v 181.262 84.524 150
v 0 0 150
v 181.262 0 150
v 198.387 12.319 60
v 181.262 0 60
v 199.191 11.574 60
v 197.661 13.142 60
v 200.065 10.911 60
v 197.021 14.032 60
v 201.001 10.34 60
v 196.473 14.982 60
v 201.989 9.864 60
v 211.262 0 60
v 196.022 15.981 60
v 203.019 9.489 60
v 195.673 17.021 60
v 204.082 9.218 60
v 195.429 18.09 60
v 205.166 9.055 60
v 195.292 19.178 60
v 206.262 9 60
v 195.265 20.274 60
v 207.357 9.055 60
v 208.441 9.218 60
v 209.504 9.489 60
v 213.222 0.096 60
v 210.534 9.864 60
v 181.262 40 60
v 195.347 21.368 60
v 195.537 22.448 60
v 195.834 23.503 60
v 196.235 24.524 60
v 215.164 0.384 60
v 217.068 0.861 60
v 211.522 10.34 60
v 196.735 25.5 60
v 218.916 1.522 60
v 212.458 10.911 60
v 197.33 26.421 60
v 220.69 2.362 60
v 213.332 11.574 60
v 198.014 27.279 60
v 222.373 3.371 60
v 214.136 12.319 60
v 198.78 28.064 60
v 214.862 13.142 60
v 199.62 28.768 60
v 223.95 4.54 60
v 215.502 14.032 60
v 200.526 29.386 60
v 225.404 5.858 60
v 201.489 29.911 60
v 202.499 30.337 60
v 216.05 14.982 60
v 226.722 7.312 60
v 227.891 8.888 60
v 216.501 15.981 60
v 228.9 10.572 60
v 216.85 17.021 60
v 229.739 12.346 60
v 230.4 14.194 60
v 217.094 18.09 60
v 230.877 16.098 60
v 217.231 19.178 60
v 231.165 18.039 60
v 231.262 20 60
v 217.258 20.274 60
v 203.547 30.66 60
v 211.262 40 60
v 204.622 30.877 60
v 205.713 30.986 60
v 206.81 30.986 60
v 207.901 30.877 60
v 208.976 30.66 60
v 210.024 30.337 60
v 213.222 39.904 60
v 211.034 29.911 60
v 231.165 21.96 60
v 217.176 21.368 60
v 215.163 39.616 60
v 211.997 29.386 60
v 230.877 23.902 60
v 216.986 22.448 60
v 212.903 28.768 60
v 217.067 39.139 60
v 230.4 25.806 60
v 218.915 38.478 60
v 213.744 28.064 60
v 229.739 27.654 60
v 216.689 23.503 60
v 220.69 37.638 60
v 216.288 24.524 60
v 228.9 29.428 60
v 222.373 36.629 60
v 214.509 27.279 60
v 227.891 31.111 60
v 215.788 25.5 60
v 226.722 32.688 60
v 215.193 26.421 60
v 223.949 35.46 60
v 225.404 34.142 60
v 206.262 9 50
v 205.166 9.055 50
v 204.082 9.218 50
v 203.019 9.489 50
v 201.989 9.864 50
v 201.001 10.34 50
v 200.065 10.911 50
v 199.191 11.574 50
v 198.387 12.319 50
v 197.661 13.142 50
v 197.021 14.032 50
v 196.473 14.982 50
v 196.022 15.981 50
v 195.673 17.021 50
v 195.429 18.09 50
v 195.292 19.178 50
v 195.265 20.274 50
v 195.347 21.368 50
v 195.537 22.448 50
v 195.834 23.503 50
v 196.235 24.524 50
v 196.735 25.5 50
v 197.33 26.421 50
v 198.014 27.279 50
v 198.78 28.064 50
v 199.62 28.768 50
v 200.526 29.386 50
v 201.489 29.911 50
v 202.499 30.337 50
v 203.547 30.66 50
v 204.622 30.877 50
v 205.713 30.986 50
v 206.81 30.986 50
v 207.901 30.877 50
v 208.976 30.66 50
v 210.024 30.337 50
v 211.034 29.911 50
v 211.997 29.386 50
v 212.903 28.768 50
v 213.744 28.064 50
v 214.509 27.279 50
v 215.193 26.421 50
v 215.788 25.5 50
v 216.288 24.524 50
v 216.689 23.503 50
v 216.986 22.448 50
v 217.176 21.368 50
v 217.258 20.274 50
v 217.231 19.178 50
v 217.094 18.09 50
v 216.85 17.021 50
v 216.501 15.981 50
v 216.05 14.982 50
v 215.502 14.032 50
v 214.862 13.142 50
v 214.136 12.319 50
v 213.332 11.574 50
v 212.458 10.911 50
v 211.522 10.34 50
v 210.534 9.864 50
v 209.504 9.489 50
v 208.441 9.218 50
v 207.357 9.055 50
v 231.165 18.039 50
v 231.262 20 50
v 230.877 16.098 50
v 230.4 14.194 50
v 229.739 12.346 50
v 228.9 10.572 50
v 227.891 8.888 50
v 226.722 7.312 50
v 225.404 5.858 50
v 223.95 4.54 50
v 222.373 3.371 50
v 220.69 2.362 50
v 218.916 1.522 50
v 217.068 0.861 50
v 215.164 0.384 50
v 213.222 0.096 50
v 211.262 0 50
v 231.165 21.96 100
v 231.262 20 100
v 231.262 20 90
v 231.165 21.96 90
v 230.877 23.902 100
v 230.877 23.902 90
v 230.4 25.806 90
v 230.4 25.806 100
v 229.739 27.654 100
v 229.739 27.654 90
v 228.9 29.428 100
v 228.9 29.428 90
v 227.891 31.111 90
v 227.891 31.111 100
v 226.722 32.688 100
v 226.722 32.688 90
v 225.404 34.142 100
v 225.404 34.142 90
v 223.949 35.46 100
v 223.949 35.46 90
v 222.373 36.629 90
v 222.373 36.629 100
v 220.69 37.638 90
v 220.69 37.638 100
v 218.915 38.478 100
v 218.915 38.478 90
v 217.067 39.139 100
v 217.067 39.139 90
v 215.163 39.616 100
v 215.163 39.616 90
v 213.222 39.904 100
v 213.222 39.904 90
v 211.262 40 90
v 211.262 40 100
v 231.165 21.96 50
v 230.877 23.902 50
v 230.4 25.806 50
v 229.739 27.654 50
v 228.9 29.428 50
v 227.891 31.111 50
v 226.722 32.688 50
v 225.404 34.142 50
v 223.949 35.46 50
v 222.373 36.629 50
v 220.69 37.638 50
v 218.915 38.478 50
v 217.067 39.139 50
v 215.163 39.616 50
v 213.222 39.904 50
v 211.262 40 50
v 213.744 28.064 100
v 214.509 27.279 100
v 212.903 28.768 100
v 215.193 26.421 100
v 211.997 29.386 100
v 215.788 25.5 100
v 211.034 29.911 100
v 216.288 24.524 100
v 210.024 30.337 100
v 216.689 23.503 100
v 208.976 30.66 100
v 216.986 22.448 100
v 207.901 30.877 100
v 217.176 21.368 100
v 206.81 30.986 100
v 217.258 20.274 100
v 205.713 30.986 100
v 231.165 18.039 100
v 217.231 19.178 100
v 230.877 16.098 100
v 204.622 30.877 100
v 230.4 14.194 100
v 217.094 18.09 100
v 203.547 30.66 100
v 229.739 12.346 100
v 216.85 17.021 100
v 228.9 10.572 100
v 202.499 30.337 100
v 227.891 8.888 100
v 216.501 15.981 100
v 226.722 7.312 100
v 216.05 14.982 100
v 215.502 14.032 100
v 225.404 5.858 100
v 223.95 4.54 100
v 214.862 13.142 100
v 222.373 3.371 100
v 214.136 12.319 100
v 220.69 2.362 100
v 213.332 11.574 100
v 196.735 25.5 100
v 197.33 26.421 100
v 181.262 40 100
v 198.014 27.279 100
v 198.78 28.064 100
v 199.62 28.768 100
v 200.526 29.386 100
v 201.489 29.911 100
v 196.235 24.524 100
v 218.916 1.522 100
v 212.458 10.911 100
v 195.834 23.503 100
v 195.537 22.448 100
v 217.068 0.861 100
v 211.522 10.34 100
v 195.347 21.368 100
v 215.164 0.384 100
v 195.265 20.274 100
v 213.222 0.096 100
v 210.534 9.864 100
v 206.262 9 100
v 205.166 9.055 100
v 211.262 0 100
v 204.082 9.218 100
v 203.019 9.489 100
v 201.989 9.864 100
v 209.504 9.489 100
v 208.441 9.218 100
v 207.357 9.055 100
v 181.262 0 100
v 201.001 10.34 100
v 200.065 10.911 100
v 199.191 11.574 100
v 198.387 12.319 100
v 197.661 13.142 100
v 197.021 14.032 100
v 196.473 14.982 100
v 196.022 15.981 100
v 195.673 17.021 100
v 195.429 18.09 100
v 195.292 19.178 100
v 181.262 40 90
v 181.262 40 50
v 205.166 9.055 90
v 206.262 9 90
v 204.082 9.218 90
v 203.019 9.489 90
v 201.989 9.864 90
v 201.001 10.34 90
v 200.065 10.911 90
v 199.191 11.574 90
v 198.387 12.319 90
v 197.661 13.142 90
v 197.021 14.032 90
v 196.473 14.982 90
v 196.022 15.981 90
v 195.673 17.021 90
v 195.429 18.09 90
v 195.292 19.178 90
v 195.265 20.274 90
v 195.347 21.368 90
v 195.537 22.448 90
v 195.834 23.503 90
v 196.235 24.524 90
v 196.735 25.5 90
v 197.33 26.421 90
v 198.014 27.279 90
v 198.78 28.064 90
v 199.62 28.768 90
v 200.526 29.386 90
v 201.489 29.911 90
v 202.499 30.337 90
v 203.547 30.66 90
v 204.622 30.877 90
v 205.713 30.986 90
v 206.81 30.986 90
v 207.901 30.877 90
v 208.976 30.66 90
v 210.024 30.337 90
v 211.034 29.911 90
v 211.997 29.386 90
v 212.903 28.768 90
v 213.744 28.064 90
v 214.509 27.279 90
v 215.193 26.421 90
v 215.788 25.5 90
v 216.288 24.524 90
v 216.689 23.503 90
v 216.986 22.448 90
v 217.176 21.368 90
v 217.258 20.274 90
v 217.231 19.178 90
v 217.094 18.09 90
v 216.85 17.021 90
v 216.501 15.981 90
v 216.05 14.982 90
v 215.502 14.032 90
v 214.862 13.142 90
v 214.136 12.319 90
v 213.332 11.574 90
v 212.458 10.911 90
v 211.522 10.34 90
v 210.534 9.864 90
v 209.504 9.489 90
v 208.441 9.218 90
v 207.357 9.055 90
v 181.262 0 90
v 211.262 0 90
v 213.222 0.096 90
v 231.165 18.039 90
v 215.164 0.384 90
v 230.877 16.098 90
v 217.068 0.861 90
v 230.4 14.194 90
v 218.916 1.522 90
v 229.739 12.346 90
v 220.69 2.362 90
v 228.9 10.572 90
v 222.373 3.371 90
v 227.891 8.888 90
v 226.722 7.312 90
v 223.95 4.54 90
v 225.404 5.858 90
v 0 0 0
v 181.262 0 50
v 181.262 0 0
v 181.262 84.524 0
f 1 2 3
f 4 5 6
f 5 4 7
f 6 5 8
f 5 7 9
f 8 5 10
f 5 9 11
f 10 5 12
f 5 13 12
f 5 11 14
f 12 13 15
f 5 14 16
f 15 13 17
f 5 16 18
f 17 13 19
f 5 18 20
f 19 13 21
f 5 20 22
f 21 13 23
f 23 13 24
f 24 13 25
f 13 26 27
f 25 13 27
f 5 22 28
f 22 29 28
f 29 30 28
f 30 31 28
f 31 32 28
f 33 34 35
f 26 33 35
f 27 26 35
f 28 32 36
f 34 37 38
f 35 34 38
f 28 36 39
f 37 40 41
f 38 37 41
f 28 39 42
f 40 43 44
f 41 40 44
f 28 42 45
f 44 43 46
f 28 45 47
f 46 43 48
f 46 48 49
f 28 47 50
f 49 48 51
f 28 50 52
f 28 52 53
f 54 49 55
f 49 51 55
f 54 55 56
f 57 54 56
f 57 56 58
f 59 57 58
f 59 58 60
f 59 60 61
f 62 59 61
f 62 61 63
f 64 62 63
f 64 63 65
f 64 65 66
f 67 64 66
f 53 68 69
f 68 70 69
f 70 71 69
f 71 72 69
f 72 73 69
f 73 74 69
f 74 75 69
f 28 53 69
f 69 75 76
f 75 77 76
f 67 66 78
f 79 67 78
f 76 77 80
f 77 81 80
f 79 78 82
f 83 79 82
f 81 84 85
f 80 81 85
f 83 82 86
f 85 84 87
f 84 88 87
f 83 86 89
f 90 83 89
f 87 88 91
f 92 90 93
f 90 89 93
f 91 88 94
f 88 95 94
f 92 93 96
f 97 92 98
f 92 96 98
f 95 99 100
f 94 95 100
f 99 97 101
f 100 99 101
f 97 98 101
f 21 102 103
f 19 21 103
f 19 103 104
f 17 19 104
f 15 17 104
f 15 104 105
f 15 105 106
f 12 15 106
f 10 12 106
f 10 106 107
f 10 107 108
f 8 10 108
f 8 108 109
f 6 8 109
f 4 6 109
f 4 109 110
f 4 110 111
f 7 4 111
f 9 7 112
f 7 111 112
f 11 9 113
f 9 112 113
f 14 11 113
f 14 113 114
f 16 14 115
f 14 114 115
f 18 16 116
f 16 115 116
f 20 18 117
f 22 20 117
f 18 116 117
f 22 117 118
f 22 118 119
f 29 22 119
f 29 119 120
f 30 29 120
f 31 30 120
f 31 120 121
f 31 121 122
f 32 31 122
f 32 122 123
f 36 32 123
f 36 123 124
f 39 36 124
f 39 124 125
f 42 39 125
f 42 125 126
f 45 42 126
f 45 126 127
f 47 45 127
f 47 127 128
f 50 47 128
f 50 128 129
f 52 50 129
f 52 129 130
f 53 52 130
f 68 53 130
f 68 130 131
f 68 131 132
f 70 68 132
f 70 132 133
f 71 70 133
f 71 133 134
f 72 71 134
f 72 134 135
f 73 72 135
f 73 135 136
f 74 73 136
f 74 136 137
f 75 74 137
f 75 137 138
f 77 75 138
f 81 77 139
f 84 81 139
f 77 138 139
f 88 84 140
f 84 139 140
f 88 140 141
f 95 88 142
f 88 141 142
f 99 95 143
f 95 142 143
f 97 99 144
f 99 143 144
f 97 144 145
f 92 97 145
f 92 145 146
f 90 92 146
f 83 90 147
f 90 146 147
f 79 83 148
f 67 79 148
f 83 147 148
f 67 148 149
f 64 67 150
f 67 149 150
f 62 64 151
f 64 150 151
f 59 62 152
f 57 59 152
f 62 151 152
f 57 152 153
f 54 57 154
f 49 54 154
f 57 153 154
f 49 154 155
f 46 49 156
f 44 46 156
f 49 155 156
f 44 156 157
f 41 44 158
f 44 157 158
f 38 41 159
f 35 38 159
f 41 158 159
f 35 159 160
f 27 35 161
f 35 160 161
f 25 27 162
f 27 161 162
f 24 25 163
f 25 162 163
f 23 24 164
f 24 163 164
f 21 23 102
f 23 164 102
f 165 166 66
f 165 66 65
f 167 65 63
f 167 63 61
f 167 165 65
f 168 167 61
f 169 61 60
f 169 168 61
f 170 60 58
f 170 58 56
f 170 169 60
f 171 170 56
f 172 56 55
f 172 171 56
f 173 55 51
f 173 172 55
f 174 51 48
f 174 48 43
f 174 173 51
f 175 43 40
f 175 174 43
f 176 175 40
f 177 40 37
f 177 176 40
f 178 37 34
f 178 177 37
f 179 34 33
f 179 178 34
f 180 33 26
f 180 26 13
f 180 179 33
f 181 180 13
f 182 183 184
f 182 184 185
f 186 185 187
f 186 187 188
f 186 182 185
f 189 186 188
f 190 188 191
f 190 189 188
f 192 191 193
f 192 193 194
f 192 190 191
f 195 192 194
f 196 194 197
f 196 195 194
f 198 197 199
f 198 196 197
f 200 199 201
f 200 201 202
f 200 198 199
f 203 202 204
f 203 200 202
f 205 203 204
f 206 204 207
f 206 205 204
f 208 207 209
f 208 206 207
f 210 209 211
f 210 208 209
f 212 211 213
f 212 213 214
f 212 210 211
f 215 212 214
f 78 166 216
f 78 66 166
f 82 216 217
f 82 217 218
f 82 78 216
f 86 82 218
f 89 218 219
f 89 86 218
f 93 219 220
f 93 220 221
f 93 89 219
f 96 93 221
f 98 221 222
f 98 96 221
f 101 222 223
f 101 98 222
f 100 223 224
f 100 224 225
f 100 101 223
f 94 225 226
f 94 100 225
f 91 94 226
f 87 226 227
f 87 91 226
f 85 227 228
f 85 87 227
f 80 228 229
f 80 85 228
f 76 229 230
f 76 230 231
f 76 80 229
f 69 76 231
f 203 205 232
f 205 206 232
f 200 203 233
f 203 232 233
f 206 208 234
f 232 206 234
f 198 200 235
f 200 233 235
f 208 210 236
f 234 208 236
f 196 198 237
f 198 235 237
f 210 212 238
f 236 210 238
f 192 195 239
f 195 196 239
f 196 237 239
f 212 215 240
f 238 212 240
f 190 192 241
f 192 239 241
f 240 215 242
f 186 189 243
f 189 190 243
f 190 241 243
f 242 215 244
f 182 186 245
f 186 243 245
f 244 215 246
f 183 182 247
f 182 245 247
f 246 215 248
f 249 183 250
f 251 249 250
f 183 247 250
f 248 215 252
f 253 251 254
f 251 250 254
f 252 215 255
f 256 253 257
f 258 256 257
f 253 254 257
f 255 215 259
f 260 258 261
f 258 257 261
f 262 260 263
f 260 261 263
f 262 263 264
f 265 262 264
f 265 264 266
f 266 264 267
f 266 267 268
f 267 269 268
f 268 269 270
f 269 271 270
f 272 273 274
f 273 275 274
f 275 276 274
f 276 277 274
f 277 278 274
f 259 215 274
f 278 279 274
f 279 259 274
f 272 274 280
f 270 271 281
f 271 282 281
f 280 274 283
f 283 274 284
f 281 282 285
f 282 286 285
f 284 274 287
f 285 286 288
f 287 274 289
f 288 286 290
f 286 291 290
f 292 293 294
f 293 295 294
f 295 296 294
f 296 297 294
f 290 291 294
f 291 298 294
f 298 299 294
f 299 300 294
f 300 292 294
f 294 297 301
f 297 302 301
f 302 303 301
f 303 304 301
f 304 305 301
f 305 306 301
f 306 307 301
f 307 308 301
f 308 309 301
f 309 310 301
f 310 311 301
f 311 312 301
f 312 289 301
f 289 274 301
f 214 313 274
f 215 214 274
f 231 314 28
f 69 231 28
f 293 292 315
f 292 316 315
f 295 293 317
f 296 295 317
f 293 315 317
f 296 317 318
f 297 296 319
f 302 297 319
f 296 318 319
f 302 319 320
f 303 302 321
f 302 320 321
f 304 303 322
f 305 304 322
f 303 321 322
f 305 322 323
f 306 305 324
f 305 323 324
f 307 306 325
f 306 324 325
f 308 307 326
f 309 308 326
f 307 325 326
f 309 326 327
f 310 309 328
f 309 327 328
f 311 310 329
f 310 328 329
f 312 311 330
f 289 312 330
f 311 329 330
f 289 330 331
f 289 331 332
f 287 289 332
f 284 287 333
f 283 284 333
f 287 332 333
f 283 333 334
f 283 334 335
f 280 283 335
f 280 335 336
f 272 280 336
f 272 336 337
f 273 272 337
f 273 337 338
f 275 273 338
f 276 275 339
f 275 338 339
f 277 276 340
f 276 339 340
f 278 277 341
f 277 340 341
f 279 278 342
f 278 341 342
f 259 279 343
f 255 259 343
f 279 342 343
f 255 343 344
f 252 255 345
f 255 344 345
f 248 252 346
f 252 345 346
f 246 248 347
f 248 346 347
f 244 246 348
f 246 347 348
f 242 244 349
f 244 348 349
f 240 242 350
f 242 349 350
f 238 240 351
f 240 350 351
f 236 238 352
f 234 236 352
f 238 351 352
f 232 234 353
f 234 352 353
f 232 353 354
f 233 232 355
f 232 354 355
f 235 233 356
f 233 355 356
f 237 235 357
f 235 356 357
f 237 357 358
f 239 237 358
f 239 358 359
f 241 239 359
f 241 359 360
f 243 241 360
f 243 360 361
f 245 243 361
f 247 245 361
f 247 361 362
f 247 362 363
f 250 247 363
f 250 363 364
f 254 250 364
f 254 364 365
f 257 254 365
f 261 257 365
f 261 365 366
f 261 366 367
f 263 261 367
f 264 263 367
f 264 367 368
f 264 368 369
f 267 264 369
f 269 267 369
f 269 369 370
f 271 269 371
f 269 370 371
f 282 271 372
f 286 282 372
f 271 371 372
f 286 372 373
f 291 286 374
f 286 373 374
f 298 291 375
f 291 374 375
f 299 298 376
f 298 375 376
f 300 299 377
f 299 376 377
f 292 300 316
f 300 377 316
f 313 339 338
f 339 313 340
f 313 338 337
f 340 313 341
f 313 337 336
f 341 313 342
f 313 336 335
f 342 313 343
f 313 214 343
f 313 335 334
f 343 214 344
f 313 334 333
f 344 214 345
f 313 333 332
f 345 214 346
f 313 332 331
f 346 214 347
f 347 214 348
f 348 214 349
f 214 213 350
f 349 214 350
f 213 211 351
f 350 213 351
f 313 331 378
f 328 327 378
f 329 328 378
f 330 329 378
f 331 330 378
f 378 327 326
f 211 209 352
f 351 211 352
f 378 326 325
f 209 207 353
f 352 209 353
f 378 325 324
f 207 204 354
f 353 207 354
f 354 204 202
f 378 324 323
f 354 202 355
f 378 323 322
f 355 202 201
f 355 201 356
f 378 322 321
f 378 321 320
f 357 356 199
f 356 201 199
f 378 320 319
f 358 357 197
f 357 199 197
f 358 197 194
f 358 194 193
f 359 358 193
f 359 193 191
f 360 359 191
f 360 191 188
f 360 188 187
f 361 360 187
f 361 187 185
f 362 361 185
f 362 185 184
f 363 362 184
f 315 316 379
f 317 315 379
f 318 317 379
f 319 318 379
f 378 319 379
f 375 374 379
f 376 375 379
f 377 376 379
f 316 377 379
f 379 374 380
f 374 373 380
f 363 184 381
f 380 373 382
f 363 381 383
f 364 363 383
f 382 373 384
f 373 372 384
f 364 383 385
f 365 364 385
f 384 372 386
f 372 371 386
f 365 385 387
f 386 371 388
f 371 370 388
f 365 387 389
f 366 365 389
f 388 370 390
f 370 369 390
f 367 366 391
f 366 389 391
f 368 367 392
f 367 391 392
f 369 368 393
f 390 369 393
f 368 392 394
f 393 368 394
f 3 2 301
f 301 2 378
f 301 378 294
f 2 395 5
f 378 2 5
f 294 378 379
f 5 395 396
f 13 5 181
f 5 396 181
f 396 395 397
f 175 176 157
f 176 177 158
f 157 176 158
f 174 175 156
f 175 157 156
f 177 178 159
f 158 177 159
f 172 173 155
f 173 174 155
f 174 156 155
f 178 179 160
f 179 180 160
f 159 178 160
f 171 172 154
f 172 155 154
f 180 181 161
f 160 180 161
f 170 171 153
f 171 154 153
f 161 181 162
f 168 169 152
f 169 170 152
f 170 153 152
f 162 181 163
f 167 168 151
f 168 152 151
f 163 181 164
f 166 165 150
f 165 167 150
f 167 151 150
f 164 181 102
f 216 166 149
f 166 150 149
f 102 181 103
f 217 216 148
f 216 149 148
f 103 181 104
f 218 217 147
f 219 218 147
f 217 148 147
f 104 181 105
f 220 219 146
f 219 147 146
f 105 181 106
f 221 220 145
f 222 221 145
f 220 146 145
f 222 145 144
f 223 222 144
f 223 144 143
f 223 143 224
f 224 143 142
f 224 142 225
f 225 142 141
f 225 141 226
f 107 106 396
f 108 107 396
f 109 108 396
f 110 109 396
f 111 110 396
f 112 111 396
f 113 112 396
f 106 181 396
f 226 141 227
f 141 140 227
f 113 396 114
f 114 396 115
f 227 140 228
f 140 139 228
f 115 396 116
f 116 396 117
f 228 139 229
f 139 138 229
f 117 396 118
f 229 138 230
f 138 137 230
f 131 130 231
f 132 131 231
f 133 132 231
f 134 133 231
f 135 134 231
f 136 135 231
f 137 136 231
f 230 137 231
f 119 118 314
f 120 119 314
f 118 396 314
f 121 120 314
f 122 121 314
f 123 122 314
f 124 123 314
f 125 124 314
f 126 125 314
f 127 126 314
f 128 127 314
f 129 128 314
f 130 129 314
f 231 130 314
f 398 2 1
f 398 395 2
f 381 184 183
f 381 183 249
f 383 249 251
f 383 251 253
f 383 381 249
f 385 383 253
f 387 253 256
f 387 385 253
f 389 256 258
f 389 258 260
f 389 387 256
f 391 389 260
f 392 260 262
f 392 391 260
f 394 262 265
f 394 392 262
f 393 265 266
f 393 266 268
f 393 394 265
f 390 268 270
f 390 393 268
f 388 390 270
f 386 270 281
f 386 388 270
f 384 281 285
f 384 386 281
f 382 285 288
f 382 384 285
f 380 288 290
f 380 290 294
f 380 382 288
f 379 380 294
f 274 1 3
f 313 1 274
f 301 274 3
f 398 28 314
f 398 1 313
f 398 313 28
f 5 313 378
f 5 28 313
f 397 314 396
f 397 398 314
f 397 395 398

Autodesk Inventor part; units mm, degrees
ref_plane "YZ Plane" through (0, 0, 0) normal (1, 0, 0) x (0, 1, 0)
ref_plane "XZ Plane" through (0, 0, 0) normal (0, 1, 0) x (-1, 0, 0)
ref_plane "XY Plane" through (0, 0, 0) normal (0, 0, 1) x (1, 0, 0)
sketch "Sketch1" plane through (0, 0, 0) normal (0, 0, 1) x (1, 0, 0)
  line L0 (0, 0) -> (181.2616, 84.5237)
  line L1 (0, 0) -> (200, 0) construction
  line L2 (0, 0) -> (181.2616, 0)
  line L3 (181.2616, 84.5237) -> (181.2616, 0)
  dimension "d2" = 200
  dimension "d3" = 25
extrude "Extrusion1" add sketch "Sketch1" along normal blind 150
sketch "Sketch2" plane through (0, 0, 150) normal (0, 0, 1) x (1, 0, 0)
  point P0 (0, 0)
sketch "Sketch3" plane through (181.2616, 0, 0) normal (1, 0, 0) x (0, 0, -1)
  line L0 (-100, 0) -> (-50, 0)
  line L1 (-50, 0) -> (-50, 40)
  line L2 (-50, 40) -> (-100, 40)
  line L3 (-100, 40) -> (-100, 0)
  dimension "d10" = 50
  dimension "d11" = 40
extrude "Extrusion2" add sketch "Sketch3" along normal blind 50
sketch "Sketch5" plane through (231.2616, 0, 0) normal (1, 0, 0) x (0, 0, -1)
  point P0 (0, 0)
sketch "Sketch6" plane through (231.2616, 0, 0) normal (1, 0, 0) x (0, 0, -1)
  line L0 (0, 0) -> (60, 0) construction
  line L1 (-60, 40) -> (-90, 40)
  line L2 (-90, 40) -> (-90, 0)
  line L3 (-90, 0) -> (-60, 0)
  line L4 (-60, 0) -> (-60, 40)
  dimension "d27" = 30
  dimension "d28" = 40
extrude "Extrusion3" cut sketch "Sketch6" against normal blind 50
sketch "Sketch8" plane through (181.2616, 0, 100) normal (0, 0, 1) x (1, 0, 0)
  line L0 (50, 0) -> (50, 40) projected
  line L1 (0, 40) -> (0, 0) projected
  line L2 (0, 40) -> (50, 40) projected
  line L3 (0, 0) -> (50, 0) projected
  point P0 (-181.2616, 0)
  point P1 (25, 20)
hole "Hole2" at (206.2616, 20, 100) direction (0, 0, -1) diameter 22 end through all
fillet "Fillet1" radius 20 1 edges at (231.2616, 40, 95)
fillet "Fillet2" radius 20 1 edges at (231.2616, 0, 95)
fillet "Fillet3" radius 20 1 edges at (231.2616, 40, 55)
fillet "Fillet4" radius 20 1 edges at (231.2616, 0, 55)
properties part number "RoboArm 2020 scoop"
